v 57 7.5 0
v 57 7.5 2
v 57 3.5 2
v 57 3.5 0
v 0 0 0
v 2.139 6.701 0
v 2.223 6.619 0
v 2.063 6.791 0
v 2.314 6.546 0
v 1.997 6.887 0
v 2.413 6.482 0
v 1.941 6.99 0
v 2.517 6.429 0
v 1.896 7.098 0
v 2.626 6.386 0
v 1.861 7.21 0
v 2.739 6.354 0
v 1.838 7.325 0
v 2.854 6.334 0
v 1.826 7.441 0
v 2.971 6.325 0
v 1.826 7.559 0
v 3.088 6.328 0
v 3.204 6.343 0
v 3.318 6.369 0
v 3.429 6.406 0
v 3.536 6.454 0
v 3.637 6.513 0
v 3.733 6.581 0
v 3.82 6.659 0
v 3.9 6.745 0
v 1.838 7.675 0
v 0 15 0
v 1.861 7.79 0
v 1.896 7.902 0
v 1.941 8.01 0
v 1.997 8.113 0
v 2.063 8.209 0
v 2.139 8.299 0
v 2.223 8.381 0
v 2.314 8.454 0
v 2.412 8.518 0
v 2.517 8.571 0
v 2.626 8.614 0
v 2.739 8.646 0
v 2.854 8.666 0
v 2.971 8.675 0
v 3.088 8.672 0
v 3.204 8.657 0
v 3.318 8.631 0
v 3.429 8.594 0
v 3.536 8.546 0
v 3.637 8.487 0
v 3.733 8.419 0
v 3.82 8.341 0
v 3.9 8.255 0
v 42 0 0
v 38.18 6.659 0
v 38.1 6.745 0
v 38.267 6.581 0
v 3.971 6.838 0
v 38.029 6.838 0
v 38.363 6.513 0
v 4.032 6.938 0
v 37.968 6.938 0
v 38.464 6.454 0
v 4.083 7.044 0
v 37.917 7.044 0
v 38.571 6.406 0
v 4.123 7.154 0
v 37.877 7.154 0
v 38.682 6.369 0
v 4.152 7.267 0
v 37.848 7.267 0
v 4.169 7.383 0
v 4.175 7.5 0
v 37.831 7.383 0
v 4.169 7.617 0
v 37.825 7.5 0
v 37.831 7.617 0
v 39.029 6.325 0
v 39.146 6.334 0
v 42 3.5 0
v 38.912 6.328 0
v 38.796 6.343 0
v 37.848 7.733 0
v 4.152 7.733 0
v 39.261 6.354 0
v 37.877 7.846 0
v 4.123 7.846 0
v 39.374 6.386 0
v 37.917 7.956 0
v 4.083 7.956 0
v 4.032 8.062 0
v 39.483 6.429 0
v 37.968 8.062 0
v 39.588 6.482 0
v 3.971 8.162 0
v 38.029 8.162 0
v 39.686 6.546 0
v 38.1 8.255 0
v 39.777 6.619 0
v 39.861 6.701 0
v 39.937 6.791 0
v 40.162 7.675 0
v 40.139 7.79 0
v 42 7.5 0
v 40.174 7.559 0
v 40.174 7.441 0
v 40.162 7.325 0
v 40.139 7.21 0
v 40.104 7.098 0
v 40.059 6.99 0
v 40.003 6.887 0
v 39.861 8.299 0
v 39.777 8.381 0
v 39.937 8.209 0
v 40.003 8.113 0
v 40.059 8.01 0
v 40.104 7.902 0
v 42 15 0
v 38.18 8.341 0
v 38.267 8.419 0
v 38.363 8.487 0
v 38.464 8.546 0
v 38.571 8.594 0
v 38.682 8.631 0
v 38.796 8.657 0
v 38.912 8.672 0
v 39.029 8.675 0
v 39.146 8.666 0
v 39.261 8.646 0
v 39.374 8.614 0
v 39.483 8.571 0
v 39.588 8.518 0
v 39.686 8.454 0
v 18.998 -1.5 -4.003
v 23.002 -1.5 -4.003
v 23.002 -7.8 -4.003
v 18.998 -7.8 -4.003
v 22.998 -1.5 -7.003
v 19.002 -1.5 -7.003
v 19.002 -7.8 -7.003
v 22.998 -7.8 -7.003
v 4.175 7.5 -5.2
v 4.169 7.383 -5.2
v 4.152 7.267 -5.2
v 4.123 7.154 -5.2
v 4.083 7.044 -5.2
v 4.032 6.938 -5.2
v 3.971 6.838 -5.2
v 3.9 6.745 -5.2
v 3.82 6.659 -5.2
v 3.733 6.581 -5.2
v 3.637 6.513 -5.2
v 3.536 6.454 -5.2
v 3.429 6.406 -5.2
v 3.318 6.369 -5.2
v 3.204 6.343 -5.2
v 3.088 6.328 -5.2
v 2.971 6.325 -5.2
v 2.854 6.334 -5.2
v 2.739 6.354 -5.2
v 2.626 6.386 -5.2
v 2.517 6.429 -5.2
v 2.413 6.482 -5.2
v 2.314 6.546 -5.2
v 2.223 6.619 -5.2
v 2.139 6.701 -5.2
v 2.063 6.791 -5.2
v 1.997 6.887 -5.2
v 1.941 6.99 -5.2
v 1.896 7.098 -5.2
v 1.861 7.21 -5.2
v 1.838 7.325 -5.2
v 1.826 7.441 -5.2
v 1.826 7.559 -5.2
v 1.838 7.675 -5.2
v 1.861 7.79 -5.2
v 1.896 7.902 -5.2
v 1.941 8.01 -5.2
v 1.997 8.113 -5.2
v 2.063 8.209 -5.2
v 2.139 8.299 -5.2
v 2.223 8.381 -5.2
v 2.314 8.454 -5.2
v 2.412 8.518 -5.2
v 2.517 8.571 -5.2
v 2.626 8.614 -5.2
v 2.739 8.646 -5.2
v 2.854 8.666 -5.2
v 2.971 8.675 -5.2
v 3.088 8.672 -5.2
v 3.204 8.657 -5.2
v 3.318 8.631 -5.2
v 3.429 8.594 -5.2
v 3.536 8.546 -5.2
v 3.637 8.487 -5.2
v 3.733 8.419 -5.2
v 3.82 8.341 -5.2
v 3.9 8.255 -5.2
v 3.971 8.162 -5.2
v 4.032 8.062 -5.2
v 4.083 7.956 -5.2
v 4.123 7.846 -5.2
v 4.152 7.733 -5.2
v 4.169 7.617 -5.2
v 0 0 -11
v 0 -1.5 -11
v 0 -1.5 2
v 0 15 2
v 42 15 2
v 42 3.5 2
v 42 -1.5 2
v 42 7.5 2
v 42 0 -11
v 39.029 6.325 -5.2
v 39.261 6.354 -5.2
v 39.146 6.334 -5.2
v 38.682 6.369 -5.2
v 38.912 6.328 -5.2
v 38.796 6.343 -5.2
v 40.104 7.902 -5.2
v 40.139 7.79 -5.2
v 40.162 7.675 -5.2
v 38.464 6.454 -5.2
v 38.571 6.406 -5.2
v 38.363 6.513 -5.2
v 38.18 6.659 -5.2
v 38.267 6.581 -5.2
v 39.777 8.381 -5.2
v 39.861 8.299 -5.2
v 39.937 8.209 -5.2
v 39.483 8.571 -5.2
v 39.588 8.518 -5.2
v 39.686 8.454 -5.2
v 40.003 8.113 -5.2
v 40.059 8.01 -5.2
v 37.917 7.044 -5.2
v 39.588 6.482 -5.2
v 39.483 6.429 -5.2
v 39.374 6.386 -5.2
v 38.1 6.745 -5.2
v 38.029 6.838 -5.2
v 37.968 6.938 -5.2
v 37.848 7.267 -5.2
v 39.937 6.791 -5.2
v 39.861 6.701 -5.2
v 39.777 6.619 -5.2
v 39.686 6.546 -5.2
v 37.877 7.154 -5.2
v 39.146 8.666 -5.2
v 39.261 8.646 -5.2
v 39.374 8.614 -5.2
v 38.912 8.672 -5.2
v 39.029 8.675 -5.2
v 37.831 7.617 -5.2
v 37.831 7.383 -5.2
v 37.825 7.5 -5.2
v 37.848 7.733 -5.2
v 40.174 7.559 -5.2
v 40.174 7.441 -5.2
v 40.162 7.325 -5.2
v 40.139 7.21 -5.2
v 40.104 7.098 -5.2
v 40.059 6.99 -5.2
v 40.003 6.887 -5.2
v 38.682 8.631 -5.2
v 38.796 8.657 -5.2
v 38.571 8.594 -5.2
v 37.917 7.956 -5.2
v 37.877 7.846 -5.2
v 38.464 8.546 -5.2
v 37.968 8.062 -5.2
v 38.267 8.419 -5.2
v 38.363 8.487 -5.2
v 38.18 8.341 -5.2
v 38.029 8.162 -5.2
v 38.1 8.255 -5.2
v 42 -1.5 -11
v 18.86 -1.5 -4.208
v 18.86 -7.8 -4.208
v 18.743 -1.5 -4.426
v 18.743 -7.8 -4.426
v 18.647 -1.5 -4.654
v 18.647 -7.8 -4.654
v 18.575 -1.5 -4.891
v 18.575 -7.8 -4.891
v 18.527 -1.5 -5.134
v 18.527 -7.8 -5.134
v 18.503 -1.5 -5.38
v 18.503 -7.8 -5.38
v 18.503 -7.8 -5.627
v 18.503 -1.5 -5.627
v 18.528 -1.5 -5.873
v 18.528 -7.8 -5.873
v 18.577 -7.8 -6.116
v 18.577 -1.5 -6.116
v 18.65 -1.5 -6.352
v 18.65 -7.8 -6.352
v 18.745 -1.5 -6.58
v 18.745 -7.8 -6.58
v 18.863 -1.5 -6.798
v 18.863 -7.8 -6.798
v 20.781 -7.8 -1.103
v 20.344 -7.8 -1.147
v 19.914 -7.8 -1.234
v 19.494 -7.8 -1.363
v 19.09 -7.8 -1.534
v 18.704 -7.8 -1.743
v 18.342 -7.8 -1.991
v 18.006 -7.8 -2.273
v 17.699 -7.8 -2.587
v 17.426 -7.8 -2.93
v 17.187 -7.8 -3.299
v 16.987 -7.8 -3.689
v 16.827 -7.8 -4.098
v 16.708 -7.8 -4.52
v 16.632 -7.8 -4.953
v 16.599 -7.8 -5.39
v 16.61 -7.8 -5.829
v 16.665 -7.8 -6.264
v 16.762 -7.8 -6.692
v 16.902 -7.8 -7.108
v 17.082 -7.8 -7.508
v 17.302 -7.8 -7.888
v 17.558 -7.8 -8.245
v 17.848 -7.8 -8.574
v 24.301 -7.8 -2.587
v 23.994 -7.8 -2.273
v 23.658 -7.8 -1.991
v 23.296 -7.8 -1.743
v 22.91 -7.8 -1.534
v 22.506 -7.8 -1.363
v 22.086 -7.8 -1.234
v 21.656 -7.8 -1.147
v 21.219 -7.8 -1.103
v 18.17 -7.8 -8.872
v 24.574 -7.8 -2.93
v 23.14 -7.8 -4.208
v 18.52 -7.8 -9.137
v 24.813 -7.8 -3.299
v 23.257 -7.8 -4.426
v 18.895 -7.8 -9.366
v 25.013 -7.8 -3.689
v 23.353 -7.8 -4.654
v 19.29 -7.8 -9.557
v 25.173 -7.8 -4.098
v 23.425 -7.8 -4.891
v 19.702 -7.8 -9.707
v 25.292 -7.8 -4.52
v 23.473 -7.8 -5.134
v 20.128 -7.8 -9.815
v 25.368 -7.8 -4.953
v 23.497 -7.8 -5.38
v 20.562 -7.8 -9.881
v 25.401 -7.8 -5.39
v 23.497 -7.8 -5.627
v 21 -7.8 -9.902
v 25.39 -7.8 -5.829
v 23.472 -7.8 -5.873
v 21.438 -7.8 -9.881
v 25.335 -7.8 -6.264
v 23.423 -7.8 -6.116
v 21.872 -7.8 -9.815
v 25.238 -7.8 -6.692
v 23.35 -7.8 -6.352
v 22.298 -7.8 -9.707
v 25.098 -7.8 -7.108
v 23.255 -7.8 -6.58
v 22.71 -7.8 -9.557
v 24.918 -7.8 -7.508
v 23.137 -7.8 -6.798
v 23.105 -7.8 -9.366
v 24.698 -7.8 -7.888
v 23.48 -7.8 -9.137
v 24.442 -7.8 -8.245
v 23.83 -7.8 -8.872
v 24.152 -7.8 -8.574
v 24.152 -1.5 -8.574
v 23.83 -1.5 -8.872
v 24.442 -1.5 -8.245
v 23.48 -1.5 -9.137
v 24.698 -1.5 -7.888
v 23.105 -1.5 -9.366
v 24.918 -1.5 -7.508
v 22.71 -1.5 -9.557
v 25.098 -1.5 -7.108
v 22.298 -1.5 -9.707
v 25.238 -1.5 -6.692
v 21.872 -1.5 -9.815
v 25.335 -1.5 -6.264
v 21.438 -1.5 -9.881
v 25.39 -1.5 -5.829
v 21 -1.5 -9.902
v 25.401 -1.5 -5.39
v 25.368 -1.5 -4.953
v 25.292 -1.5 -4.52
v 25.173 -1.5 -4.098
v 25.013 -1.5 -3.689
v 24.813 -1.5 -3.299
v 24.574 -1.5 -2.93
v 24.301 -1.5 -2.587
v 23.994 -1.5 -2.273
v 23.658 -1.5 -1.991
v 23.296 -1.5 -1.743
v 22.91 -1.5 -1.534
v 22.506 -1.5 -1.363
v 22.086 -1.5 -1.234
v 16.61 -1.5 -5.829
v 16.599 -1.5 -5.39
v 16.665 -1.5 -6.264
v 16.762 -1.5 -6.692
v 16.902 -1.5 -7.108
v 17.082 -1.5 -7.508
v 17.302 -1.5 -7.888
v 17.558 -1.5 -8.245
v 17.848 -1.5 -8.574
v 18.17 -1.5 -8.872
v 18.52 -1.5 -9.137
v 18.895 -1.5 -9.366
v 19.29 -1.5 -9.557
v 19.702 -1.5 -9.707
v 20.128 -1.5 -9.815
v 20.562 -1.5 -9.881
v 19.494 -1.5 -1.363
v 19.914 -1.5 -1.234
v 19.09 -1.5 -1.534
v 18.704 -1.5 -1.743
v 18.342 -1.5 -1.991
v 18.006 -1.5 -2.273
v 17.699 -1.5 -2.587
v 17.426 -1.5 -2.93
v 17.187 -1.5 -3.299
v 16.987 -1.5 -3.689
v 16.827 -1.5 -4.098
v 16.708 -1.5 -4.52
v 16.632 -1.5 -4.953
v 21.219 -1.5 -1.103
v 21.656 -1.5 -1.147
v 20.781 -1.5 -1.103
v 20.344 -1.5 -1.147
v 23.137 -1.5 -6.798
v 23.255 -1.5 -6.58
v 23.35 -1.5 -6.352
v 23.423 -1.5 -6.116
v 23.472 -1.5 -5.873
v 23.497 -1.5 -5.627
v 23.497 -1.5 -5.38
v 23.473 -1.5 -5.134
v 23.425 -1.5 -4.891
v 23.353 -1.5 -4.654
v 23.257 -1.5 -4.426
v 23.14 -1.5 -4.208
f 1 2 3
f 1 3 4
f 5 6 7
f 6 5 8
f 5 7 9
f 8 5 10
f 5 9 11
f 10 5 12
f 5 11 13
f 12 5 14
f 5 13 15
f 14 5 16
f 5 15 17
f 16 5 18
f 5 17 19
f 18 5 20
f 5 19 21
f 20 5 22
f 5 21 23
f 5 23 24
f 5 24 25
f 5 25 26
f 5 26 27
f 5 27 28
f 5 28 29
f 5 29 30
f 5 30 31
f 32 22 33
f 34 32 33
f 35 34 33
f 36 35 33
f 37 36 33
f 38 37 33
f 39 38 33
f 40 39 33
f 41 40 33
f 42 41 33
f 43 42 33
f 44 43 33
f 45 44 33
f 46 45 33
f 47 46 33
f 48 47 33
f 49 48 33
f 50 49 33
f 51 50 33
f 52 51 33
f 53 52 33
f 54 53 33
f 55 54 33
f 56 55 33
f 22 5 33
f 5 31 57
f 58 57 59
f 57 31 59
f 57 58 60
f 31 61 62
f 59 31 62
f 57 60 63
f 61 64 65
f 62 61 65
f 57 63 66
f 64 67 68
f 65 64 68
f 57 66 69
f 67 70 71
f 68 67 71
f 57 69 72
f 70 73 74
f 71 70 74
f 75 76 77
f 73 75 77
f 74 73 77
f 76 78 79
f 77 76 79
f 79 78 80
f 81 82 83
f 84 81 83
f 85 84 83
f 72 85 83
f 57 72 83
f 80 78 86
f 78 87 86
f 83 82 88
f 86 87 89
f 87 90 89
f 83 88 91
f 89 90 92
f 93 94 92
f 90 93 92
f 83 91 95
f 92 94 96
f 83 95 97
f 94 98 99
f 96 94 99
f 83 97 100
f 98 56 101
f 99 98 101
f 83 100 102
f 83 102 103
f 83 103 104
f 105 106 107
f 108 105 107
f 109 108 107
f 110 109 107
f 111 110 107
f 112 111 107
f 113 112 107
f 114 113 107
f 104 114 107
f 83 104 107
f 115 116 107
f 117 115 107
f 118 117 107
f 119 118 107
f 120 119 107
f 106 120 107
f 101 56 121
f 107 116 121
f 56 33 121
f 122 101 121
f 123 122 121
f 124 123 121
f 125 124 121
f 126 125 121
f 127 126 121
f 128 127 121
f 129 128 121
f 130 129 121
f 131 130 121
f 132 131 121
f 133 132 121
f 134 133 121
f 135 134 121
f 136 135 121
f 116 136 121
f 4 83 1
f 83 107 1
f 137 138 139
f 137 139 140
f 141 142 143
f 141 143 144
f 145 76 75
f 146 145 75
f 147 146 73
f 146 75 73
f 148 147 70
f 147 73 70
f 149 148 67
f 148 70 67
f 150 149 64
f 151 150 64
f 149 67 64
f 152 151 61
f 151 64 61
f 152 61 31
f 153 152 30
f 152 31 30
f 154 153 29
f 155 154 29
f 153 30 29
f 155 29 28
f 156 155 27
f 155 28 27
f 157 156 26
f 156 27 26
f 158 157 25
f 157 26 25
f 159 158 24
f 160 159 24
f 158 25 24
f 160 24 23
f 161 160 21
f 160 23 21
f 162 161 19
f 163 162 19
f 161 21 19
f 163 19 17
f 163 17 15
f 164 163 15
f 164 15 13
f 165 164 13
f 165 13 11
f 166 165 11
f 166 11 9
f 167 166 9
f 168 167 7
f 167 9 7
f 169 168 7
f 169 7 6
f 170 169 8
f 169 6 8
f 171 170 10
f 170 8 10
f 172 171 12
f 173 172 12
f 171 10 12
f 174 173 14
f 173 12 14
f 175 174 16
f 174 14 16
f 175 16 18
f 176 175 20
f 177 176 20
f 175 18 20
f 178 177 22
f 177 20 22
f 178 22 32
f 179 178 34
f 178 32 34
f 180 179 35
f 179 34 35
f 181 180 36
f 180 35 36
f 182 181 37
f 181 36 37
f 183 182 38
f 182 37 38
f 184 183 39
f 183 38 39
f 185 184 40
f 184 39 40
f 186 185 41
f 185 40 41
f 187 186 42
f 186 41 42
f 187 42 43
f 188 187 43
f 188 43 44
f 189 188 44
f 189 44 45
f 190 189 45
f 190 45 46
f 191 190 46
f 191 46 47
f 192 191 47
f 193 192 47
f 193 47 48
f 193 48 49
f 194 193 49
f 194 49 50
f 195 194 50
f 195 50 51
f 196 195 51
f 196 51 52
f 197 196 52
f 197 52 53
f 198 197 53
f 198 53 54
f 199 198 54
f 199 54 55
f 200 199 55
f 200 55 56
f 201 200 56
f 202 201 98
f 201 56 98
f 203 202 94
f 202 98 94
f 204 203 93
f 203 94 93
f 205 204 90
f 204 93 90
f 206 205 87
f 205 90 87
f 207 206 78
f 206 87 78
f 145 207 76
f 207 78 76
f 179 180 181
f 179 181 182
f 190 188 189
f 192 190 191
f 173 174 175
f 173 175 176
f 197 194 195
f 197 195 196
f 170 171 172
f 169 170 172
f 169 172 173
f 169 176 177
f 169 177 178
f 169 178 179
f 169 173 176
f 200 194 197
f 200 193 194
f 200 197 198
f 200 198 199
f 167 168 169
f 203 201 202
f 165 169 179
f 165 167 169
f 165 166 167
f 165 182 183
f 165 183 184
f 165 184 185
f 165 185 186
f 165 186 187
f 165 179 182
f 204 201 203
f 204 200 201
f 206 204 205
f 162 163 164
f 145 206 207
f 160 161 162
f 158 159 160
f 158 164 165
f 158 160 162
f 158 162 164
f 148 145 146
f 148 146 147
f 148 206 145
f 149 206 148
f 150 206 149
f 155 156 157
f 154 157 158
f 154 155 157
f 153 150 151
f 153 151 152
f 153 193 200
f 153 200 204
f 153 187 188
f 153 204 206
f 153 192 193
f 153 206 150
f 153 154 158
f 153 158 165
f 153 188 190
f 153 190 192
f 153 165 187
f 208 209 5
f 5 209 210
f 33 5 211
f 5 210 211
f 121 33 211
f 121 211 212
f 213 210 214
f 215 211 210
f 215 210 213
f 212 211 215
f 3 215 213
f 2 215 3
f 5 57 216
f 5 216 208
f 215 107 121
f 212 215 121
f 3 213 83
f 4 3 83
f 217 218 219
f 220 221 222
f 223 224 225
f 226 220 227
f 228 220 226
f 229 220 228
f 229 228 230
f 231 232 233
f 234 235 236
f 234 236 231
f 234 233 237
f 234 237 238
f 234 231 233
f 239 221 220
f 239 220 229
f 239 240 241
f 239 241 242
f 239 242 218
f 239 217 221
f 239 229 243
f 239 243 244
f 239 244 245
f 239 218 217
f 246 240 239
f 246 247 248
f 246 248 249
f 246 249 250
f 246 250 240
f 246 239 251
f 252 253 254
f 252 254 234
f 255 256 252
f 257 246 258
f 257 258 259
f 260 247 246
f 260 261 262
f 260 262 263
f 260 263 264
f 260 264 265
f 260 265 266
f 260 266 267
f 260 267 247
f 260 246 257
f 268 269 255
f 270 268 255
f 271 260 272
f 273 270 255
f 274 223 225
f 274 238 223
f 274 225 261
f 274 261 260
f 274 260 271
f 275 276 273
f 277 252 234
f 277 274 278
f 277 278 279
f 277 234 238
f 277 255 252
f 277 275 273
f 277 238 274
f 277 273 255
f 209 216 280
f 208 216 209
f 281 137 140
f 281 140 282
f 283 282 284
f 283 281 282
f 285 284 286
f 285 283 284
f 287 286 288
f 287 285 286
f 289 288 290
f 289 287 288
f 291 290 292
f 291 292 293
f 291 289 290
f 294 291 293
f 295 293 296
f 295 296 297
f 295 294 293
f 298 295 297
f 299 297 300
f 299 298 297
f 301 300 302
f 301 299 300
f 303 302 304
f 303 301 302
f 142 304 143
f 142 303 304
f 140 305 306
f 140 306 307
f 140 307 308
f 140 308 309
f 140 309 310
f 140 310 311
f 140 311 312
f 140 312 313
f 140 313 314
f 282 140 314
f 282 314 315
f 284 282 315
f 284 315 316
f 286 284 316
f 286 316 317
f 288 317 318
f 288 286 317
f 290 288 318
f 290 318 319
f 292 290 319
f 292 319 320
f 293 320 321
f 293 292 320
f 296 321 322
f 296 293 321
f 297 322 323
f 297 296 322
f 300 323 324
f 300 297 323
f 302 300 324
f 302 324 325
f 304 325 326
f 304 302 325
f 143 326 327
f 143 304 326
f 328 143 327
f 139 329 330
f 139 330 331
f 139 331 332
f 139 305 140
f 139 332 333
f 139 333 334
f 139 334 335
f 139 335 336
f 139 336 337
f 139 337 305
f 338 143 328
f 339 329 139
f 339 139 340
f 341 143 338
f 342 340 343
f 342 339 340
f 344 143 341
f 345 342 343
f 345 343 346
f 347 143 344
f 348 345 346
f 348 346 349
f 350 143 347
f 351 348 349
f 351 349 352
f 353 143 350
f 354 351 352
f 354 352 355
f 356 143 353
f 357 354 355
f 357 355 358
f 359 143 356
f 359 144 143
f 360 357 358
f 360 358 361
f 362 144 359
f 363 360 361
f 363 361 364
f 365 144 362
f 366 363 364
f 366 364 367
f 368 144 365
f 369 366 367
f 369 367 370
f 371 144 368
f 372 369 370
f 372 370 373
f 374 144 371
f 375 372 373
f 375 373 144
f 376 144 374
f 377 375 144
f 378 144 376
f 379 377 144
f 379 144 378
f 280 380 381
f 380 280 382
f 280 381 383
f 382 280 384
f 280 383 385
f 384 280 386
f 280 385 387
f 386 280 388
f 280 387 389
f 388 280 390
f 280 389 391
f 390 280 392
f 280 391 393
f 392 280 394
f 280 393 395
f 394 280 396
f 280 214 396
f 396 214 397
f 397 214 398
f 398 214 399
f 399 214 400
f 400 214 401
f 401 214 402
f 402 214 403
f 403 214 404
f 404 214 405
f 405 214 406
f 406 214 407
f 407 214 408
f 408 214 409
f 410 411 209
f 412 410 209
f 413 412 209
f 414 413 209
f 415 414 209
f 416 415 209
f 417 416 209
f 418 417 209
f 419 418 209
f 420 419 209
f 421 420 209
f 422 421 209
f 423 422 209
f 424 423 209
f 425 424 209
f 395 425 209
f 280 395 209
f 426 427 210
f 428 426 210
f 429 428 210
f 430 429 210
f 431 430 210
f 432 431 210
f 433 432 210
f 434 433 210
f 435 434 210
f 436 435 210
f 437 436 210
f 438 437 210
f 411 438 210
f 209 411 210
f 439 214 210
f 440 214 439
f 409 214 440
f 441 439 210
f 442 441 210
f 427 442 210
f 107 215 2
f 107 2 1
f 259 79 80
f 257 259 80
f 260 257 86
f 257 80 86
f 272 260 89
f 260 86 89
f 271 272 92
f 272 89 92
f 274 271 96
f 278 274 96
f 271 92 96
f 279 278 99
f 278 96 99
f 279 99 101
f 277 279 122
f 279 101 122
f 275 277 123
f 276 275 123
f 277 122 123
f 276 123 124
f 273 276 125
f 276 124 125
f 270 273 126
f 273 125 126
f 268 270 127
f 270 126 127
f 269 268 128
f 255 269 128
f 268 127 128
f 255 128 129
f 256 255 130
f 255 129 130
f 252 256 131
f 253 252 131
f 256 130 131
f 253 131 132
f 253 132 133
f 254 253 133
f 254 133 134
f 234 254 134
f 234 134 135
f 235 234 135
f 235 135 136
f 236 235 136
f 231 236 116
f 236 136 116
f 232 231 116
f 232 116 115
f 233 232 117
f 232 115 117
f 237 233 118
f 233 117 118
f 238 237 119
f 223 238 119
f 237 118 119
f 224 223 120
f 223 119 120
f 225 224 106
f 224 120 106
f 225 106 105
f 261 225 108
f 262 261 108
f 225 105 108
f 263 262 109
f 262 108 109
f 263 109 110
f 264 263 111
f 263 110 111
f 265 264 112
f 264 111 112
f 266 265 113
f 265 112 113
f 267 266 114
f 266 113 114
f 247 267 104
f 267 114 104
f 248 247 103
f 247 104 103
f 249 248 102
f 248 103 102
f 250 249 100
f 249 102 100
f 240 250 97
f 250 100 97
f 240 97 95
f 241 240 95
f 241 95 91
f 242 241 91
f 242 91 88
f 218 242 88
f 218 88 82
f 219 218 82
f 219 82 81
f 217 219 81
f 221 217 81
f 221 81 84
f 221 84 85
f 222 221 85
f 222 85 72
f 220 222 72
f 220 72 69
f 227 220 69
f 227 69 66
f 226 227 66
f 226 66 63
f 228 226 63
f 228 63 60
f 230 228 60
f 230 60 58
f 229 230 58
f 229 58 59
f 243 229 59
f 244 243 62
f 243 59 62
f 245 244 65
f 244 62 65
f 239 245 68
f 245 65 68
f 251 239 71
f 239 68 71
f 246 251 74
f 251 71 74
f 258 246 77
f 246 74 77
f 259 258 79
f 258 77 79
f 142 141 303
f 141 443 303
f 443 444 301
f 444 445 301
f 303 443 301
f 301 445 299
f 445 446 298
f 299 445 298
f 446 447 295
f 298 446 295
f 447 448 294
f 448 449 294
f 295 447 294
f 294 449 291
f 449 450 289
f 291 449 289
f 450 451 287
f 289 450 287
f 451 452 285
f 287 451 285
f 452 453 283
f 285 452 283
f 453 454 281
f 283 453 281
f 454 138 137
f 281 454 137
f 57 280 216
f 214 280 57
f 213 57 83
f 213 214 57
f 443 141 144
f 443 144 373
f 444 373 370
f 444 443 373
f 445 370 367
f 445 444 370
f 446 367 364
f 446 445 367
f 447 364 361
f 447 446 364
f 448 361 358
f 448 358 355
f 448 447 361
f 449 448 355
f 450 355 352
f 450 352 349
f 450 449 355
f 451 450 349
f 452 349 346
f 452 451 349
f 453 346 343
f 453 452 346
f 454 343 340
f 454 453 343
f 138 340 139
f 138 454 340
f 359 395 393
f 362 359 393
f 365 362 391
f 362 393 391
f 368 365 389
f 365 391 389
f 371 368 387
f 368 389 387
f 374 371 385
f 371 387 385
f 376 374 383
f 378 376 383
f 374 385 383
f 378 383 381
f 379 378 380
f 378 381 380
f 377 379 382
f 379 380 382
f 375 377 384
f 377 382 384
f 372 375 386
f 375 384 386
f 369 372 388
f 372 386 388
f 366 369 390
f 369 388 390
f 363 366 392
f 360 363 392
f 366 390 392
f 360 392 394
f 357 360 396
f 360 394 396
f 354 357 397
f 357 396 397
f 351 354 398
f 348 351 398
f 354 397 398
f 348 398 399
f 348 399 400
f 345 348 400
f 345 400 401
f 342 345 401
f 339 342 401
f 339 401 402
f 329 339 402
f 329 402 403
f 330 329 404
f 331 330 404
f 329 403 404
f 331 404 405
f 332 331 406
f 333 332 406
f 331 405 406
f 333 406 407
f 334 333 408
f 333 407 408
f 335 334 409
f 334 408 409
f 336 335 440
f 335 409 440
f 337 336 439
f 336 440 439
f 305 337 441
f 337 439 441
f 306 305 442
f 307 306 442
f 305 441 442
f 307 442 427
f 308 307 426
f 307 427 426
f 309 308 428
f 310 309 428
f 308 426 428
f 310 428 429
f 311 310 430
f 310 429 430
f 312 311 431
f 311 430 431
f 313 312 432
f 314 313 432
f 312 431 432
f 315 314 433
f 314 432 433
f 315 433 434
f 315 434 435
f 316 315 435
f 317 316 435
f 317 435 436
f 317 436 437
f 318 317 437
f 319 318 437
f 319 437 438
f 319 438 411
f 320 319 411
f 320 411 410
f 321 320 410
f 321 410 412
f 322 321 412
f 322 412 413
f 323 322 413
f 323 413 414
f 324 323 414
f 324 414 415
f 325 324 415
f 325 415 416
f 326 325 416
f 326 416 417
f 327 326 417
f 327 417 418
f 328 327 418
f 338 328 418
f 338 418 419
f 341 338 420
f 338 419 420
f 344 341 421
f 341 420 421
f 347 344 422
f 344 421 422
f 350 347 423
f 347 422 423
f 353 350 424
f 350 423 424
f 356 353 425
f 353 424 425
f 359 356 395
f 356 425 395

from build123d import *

# Parameters (mm, degrees)
ESQUISSE1_W        = 42
ESQUISSE1_H        = 15
BOSS_EXTRU_1_DEPTH = 2
ESQUISSE2_R        = 1.175
BOSS_EXTRU_2_DEPTH = 5.2
ESQUISSE3_W        = 2
ESQUISSE3_H        = 4
BOSS_EXTRU_3_DEPTH = 15
ESQUISSE4_W        = 42
ESQUISSE4_H        = 2
BOSS_EXTRU_4_DEPTH = 1.5
ESQUISSE5_W        = 42
ESQUISSE5_H        = 1.5
BOSS_EXTRU_5_DEPTH = 11
ESQUISSE6_R        = 4.402379767
BOSS_EXTRU_6_DEPTH = 6.3


with BuildPart() as part:
    # Esquisse1 → Boss.-Extru.1 (new body)
    with BuildSketch(Plane.XY):
        with Locations((21, 7.5)):
            Rectangle(ESQUISSE1_W, ESQUISSE1_H)
    extrude(amount=BOSS_EXTRU_1_DEPTH)

    # Esquisse2 → Boss.-Extru.2 (add)
    with BuildSketch(Plane(origin=(0, 0, 0), x_dir=(-1, 0, 0), z_dir=(0, 0, -1))):
        with Locations((-39, 7.5)):
            Circle(ESQUISSE2_R)
        with Locations(Location((-3, 7.5, 0), (0, 0, 180))):
            Circle(ESQUISSE2_R)
    extrude(amount=BOSS_EXTRU_2_DEPTH)

    # Esquisse3 → Boss.-Extru.3 (add)
    with BuildSketch(Plane(origin=(42, 0, 0), x_dir=(0, 0, -1), z_dir=(1, 0, 0))):
        with Locations((-1, 5.5)):
            Rectangle(ESQUISSE3_W, ESQUISSE3_H)
    extrude(amount=BOSS_EXTRU_3_DEPTH)

    # Esquisse4 → Boss.-Extru.4 (add)
    with BuildSketch(Plane.XZ):
        with Locations((21, 1)):
            Rectangle(ESQUISSE4_W, ESQUISSE4_H)
    extrude(amount=BOSS_EXTRU_4_DEPTH)

    # Esquisse5 → Boss.-Extru.5 (add)
    with BuildSketch(Plane(origin=(0, 0, 0), x_dir=(-1, 0, 0), z_dir=(0, 0, -1))):
        with Locations((-21, -0.75)):
            Rectangle(ESQUISSE5_W, ESQUISSE5_H)
    extrude(amount=BOSS_EXTRU_5_DEPTH)

    # Esquisse6 → Boss.-Extru.6 (add)
    with BuildSketch(Plane.XZ.offset(1.5)):
        with Locations(Location((21, -5.5, 0), (0, 0, 270))):
            Circle(ESQUISSE6_R)
        with BuildLine():
            Line((19.002059064, -7.0027415), (22.997940936, -7.0027415))
            ThreePointArc((22.997940936, -7.0027415), (23.499997651, -5.503426877), (23.002053192, -4.0027415))
            Line((23.002053192, -4.0027415), (18.997946808, -4.0027415))
            ThreePointArc((18.997946808, -4.0027415), (18.500002349, -5.503426877), (19.002059064, -7.0027415))
        make_face(mode=Mode.SUBTRACT)
    extrude(amount=BOSS_EXTRU_6_DEPTH)


solid = part.part
